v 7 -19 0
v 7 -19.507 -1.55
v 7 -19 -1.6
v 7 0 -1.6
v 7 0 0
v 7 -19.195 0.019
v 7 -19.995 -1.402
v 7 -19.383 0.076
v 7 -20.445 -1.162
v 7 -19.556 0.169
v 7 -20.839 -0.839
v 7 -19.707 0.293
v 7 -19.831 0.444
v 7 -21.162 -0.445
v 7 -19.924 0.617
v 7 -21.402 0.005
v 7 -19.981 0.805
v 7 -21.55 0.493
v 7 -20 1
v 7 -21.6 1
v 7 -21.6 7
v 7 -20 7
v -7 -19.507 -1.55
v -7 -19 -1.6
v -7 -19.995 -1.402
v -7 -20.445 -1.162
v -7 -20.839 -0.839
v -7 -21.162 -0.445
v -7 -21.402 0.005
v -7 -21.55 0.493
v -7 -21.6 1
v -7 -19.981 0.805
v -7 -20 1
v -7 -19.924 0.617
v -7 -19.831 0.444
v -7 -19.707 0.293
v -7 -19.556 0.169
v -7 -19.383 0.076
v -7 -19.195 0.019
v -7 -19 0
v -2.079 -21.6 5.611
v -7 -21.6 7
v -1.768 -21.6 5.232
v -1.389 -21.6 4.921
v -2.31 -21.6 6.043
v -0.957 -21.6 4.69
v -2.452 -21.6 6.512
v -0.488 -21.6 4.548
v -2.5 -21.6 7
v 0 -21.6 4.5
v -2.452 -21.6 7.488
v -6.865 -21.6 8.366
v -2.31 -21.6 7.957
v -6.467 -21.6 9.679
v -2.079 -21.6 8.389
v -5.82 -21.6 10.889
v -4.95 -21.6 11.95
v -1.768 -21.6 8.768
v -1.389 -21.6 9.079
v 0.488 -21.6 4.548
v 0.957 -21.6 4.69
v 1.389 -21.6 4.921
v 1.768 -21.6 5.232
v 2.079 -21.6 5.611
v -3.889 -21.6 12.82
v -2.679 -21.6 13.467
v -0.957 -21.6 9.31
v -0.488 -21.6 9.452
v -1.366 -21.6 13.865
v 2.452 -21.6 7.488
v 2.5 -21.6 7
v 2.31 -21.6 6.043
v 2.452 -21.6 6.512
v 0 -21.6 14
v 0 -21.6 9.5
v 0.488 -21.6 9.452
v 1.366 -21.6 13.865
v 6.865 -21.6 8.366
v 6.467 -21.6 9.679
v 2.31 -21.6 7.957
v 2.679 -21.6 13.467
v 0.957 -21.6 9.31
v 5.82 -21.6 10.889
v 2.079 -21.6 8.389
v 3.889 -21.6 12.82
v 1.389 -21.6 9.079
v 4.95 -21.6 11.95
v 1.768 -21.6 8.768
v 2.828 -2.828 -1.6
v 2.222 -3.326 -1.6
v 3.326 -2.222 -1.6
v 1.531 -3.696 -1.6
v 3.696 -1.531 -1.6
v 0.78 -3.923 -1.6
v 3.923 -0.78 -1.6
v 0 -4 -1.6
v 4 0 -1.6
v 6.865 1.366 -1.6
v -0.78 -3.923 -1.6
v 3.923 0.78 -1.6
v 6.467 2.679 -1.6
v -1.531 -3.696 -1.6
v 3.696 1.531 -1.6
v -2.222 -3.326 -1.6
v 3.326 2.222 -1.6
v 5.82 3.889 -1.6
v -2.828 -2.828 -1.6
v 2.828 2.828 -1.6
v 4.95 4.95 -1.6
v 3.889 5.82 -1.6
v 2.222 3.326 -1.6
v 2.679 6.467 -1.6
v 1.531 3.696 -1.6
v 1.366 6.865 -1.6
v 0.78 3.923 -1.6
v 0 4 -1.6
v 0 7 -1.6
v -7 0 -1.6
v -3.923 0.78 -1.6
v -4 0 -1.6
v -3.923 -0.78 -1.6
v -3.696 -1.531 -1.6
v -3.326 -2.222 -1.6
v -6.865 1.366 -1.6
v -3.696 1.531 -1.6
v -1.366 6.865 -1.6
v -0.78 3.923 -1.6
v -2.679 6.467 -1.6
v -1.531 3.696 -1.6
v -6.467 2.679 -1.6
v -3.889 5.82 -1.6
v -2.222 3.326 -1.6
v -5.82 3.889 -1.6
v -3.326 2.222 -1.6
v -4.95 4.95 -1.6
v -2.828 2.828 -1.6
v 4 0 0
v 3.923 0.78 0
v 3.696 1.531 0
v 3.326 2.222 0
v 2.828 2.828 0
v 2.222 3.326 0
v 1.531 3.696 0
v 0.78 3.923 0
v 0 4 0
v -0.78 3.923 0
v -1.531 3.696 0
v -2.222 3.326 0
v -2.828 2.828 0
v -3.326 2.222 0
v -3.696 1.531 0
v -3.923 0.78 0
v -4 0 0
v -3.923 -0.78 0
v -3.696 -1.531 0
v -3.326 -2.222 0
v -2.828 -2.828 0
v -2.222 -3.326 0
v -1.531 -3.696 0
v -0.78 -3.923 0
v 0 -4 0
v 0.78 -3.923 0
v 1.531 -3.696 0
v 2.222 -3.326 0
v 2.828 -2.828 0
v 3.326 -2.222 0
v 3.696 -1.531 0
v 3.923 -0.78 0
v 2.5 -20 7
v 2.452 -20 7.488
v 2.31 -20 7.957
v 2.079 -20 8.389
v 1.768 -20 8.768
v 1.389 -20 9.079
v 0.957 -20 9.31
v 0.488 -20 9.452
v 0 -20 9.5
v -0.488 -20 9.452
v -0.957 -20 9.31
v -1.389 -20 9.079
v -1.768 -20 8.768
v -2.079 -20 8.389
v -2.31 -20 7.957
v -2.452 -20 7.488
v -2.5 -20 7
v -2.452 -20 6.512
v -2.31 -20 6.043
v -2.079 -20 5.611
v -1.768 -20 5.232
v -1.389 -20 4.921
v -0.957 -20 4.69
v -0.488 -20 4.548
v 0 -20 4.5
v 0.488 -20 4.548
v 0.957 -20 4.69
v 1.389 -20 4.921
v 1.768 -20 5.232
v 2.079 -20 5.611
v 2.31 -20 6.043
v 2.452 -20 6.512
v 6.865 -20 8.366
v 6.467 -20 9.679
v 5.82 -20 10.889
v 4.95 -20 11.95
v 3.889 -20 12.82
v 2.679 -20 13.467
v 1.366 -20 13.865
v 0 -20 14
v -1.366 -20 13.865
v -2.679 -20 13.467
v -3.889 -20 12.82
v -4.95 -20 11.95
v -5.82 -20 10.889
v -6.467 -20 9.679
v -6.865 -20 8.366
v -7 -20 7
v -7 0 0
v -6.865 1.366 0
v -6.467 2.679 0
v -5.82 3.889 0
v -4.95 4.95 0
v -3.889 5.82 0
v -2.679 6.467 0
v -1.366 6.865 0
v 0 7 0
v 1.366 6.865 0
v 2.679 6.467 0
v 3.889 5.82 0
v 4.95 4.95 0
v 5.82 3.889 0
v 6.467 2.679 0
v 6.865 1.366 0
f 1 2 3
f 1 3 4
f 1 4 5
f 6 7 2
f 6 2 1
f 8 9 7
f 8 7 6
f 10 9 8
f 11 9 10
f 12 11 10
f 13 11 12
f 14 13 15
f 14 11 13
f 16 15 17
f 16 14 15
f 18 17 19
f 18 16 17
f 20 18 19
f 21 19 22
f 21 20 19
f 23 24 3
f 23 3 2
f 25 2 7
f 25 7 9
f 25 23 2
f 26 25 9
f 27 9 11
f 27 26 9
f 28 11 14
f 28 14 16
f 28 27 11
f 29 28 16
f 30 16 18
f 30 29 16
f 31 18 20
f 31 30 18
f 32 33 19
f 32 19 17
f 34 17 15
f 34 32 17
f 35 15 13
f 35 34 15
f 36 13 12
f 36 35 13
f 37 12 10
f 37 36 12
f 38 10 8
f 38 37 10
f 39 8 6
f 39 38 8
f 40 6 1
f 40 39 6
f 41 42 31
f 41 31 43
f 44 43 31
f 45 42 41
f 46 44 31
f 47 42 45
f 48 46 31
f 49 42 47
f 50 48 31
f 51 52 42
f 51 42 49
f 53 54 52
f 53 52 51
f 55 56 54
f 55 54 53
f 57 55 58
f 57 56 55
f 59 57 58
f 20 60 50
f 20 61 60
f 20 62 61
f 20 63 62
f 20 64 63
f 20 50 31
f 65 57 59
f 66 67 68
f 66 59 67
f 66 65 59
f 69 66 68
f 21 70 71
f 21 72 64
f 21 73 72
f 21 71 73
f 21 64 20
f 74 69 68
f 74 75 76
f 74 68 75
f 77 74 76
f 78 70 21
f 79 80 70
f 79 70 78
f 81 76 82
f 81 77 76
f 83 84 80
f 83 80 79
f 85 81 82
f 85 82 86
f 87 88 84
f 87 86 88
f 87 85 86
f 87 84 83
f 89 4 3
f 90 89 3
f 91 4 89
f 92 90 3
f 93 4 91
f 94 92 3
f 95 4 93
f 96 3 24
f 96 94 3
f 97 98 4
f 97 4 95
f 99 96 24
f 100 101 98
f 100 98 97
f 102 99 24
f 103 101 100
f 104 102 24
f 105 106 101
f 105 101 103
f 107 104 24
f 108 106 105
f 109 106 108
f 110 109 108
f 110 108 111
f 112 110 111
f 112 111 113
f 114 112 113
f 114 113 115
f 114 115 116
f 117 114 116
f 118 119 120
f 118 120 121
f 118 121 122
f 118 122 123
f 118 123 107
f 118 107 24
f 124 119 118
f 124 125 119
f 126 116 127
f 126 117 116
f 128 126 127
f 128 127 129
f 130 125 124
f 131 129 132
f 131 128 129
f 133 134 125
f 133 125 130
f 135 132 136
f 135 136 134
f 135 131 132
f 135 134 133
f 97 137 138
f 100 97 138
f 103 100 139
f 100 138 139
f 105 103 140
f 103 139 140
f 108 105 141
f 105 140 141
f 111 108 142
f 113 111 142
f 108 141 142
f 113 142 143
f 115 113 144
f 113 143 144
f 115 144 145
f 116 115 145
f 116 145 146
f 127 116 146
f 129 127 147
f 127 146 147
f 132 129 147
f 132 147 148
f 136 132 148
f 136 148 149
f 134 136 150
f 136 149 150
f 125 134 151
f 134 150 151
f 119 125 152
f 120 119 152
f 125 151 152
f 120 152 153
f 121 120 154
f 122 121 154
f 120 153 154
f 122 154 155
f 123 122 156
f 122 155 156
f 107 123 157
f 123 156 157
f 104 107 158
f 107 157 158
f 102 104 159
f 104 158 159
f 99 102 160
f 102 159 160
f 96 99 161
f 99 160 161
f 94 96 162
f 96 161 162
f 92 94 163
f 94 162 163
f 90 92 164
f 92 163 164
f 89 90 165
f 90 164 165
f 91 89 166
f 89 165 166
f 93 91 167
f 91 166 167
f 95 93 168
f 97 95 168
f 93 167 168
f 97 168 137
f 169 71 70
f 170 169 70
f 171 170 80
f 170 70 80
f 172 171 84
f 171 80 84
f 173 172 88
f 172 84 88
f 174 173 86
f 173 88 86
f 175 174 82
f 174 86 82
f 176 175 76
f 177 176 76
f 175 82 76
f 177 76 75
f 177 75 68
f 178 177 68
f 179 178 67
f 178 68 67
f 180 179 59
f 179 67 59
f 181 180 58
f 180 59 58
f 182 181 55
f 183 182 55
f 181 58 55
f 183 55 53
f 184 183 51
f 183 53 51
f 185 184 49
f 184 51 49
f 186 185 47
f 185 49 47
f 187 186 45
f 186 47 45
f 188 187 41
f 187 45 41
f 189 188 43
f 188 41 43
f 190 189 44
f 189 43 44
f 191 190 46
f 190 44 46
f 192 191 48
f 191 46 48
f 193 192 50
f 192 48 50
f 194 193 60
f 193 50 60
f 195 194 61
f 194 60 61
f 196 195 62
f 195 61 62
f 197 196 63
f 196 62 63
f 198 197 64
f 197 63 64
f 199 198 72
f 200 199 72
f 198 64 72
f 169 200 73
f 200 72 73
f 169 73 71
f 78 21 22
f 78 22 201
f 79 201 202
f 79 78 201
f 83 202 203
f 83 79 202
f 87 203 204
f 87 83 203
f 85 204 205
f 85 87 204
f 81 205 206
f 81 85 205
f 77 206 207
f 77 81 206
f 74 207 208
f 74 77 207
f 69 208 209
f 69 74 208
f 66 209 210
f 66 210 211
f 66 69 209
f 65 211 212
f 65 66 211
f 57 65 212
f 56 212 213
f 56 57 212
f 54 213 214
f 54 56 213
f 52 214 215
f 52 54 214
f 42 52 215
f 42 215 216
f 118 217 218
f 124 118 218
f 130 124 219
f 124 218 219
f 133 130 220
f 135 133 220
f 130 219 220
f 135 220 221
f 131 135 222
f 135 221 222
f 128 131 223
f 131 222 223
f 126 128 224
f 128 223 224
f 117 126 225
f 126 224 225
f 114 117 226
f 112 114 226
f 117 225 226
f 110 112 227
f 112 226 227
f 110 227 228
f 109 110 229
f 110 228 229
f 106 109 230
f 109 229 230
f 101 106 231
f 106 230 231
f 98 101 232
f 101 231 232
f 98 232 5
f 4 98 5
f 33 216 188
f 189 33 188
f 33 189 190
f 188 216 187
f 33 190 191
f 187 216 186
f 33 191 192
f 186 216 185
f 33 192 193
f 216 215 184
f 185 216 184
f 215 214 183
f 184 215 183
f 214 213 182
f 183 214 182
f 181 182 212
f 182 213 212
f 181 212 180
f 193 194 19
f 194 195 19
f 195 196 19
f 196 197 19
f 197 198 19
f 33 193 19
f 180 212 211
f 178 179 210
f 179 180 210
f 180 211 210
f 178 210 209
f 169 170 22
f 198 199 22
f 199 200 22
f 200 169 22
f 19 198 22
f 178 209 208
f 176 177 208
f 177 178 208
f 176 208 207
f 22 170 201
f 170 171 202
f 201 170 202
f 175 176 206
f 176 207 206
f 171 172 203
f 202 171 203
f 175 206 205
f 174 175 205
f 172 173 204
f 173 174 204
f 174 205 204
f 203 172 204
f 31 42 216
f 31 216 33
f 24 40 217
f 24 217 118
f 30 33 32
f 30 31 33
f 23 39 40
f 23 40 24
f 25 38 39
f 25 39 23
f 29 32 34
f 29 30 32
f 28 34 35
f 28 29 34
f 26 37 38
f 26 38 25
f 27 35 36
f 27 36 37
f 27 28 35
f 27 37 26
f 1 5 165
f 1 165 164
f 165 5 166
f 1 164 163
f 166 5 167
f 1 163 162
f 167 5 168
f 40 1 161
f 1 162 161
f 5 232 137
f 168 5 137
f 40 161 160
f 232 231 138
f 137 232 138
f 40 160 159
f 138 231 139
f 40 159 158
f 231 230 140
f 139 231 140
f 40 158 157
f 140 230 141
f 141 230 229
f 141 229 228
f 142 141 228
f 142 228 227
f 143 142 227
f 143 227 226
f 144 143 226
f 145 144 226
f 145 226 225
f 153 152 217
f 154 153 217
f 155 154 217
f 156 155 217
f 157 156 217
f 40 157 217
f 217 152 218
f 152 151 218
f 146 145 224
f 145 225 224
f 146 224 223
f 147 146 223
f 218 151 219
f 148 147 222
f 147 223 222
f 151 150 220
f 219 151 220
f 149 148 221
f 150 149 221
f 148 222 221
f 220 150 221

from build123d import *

# Parameters (mm, degrees)
SKETCH1_R                    = 4
BASE_FLANGE1_DEPTH           = 1.6002
EDGE_FLANGE1_STRIP_W         = 8.40080108
EDGE_FLANGE1_STRIP_H         = 1.6002
EDGE_FLANGE1_STRIP_CUT_DEPTH = 14
EDGE_FLANGE1_DEPTH           = 14
EDGE_FLANGE1_START           = 1.6002
EDGE_FLANGE1_PROFILE_R       = 2.5
EDGE_FLANGE1_FLAT_DEPTH      = 1.6002


# Sheet-metal steps are written as plain solids
with BuildPart() as part:
    # Sketch1 → Base-Flange1 (new body)
    with BuildSketch(Plane.XY):
        with BuildLine():
            Line((-7, -20), (-7, 0))
            ThreePointArc((-7, 0), (0, 7), (7, 0))
            Line((7, 0), (7, -20))
            Line((7, -20), (-7, -20))
        make_face()
        Circle(SKETCH1_R, mode=Mode.SUBTRACT)
    extrude(amount=-BASE_FLANGE1_DEPTH)

    # Edge-Flange1 strip (across the edge) → Edge-Flange1 strip cut (cut)
    with BuildSketch(Plane(origin=(-7, -20, 0), x_dir=(0, 1, 0), z_dir=(1, 0, 0))):
        with Locations((-3.2004, -0.8001)):
            Rectangle(EDGE_FLANGE1_STRIP_W, EDGE_FLANGE1_STRIP_H)
    extrude(amount=EDGE_FLANGE1_STRIP_CUT_DEPTH, mode=Mode.SUBTRACT)

    # Edge-Flange1 bend section (across the edge) → Edge-Flange1 (add)
    with BuildSketch(Plane(origin=(-7, -20, 0), x_dir=(0, 1, 0), z_dir=(1, 0, 0))):
        with BuildLine():
            Line((-1.6002, 1.00000054), (0, 1.00000054))
            ThreePointArc((0, 1.00000054), (0.292893377, 0.292893377), (1.00000054, 0))
            Line((1.00000054, 0), (1.00000054, -1.6002))
            ThreePointArc((1.00000054, -1.6002), (-0.838618894, -0.838618894), (-1.6002, 1.00000054))
        make_face()
    extrude(amount=EDGE_FLANGE1_DEPTH)

    # Edge-Flange1 profile (on flange) → Edge-Flange1 flat (add)
    with BuildSketch(Plane.XZ.offset(20).offset(EDGE_FLANGE1_START)):
        with BuildLine():
            ThreePointArc((7, 7), (0, 14), (-7, 7))
            Line((-7, 7), (-7, 1.00000054))
            Line((-7, 1.00000054), (7, 1.00000054))
            Line((7, 1.00000054), (7, 7))
        make_face()
        with Locations((0, 7)):
            Circle(EDGE_FLANGE1_PROFILE_R, mode=Mode.SUBTRACT)
    extrude(amount=-EDGE_FLANGE1_FLAT_DEPTH)


solid = part.part
